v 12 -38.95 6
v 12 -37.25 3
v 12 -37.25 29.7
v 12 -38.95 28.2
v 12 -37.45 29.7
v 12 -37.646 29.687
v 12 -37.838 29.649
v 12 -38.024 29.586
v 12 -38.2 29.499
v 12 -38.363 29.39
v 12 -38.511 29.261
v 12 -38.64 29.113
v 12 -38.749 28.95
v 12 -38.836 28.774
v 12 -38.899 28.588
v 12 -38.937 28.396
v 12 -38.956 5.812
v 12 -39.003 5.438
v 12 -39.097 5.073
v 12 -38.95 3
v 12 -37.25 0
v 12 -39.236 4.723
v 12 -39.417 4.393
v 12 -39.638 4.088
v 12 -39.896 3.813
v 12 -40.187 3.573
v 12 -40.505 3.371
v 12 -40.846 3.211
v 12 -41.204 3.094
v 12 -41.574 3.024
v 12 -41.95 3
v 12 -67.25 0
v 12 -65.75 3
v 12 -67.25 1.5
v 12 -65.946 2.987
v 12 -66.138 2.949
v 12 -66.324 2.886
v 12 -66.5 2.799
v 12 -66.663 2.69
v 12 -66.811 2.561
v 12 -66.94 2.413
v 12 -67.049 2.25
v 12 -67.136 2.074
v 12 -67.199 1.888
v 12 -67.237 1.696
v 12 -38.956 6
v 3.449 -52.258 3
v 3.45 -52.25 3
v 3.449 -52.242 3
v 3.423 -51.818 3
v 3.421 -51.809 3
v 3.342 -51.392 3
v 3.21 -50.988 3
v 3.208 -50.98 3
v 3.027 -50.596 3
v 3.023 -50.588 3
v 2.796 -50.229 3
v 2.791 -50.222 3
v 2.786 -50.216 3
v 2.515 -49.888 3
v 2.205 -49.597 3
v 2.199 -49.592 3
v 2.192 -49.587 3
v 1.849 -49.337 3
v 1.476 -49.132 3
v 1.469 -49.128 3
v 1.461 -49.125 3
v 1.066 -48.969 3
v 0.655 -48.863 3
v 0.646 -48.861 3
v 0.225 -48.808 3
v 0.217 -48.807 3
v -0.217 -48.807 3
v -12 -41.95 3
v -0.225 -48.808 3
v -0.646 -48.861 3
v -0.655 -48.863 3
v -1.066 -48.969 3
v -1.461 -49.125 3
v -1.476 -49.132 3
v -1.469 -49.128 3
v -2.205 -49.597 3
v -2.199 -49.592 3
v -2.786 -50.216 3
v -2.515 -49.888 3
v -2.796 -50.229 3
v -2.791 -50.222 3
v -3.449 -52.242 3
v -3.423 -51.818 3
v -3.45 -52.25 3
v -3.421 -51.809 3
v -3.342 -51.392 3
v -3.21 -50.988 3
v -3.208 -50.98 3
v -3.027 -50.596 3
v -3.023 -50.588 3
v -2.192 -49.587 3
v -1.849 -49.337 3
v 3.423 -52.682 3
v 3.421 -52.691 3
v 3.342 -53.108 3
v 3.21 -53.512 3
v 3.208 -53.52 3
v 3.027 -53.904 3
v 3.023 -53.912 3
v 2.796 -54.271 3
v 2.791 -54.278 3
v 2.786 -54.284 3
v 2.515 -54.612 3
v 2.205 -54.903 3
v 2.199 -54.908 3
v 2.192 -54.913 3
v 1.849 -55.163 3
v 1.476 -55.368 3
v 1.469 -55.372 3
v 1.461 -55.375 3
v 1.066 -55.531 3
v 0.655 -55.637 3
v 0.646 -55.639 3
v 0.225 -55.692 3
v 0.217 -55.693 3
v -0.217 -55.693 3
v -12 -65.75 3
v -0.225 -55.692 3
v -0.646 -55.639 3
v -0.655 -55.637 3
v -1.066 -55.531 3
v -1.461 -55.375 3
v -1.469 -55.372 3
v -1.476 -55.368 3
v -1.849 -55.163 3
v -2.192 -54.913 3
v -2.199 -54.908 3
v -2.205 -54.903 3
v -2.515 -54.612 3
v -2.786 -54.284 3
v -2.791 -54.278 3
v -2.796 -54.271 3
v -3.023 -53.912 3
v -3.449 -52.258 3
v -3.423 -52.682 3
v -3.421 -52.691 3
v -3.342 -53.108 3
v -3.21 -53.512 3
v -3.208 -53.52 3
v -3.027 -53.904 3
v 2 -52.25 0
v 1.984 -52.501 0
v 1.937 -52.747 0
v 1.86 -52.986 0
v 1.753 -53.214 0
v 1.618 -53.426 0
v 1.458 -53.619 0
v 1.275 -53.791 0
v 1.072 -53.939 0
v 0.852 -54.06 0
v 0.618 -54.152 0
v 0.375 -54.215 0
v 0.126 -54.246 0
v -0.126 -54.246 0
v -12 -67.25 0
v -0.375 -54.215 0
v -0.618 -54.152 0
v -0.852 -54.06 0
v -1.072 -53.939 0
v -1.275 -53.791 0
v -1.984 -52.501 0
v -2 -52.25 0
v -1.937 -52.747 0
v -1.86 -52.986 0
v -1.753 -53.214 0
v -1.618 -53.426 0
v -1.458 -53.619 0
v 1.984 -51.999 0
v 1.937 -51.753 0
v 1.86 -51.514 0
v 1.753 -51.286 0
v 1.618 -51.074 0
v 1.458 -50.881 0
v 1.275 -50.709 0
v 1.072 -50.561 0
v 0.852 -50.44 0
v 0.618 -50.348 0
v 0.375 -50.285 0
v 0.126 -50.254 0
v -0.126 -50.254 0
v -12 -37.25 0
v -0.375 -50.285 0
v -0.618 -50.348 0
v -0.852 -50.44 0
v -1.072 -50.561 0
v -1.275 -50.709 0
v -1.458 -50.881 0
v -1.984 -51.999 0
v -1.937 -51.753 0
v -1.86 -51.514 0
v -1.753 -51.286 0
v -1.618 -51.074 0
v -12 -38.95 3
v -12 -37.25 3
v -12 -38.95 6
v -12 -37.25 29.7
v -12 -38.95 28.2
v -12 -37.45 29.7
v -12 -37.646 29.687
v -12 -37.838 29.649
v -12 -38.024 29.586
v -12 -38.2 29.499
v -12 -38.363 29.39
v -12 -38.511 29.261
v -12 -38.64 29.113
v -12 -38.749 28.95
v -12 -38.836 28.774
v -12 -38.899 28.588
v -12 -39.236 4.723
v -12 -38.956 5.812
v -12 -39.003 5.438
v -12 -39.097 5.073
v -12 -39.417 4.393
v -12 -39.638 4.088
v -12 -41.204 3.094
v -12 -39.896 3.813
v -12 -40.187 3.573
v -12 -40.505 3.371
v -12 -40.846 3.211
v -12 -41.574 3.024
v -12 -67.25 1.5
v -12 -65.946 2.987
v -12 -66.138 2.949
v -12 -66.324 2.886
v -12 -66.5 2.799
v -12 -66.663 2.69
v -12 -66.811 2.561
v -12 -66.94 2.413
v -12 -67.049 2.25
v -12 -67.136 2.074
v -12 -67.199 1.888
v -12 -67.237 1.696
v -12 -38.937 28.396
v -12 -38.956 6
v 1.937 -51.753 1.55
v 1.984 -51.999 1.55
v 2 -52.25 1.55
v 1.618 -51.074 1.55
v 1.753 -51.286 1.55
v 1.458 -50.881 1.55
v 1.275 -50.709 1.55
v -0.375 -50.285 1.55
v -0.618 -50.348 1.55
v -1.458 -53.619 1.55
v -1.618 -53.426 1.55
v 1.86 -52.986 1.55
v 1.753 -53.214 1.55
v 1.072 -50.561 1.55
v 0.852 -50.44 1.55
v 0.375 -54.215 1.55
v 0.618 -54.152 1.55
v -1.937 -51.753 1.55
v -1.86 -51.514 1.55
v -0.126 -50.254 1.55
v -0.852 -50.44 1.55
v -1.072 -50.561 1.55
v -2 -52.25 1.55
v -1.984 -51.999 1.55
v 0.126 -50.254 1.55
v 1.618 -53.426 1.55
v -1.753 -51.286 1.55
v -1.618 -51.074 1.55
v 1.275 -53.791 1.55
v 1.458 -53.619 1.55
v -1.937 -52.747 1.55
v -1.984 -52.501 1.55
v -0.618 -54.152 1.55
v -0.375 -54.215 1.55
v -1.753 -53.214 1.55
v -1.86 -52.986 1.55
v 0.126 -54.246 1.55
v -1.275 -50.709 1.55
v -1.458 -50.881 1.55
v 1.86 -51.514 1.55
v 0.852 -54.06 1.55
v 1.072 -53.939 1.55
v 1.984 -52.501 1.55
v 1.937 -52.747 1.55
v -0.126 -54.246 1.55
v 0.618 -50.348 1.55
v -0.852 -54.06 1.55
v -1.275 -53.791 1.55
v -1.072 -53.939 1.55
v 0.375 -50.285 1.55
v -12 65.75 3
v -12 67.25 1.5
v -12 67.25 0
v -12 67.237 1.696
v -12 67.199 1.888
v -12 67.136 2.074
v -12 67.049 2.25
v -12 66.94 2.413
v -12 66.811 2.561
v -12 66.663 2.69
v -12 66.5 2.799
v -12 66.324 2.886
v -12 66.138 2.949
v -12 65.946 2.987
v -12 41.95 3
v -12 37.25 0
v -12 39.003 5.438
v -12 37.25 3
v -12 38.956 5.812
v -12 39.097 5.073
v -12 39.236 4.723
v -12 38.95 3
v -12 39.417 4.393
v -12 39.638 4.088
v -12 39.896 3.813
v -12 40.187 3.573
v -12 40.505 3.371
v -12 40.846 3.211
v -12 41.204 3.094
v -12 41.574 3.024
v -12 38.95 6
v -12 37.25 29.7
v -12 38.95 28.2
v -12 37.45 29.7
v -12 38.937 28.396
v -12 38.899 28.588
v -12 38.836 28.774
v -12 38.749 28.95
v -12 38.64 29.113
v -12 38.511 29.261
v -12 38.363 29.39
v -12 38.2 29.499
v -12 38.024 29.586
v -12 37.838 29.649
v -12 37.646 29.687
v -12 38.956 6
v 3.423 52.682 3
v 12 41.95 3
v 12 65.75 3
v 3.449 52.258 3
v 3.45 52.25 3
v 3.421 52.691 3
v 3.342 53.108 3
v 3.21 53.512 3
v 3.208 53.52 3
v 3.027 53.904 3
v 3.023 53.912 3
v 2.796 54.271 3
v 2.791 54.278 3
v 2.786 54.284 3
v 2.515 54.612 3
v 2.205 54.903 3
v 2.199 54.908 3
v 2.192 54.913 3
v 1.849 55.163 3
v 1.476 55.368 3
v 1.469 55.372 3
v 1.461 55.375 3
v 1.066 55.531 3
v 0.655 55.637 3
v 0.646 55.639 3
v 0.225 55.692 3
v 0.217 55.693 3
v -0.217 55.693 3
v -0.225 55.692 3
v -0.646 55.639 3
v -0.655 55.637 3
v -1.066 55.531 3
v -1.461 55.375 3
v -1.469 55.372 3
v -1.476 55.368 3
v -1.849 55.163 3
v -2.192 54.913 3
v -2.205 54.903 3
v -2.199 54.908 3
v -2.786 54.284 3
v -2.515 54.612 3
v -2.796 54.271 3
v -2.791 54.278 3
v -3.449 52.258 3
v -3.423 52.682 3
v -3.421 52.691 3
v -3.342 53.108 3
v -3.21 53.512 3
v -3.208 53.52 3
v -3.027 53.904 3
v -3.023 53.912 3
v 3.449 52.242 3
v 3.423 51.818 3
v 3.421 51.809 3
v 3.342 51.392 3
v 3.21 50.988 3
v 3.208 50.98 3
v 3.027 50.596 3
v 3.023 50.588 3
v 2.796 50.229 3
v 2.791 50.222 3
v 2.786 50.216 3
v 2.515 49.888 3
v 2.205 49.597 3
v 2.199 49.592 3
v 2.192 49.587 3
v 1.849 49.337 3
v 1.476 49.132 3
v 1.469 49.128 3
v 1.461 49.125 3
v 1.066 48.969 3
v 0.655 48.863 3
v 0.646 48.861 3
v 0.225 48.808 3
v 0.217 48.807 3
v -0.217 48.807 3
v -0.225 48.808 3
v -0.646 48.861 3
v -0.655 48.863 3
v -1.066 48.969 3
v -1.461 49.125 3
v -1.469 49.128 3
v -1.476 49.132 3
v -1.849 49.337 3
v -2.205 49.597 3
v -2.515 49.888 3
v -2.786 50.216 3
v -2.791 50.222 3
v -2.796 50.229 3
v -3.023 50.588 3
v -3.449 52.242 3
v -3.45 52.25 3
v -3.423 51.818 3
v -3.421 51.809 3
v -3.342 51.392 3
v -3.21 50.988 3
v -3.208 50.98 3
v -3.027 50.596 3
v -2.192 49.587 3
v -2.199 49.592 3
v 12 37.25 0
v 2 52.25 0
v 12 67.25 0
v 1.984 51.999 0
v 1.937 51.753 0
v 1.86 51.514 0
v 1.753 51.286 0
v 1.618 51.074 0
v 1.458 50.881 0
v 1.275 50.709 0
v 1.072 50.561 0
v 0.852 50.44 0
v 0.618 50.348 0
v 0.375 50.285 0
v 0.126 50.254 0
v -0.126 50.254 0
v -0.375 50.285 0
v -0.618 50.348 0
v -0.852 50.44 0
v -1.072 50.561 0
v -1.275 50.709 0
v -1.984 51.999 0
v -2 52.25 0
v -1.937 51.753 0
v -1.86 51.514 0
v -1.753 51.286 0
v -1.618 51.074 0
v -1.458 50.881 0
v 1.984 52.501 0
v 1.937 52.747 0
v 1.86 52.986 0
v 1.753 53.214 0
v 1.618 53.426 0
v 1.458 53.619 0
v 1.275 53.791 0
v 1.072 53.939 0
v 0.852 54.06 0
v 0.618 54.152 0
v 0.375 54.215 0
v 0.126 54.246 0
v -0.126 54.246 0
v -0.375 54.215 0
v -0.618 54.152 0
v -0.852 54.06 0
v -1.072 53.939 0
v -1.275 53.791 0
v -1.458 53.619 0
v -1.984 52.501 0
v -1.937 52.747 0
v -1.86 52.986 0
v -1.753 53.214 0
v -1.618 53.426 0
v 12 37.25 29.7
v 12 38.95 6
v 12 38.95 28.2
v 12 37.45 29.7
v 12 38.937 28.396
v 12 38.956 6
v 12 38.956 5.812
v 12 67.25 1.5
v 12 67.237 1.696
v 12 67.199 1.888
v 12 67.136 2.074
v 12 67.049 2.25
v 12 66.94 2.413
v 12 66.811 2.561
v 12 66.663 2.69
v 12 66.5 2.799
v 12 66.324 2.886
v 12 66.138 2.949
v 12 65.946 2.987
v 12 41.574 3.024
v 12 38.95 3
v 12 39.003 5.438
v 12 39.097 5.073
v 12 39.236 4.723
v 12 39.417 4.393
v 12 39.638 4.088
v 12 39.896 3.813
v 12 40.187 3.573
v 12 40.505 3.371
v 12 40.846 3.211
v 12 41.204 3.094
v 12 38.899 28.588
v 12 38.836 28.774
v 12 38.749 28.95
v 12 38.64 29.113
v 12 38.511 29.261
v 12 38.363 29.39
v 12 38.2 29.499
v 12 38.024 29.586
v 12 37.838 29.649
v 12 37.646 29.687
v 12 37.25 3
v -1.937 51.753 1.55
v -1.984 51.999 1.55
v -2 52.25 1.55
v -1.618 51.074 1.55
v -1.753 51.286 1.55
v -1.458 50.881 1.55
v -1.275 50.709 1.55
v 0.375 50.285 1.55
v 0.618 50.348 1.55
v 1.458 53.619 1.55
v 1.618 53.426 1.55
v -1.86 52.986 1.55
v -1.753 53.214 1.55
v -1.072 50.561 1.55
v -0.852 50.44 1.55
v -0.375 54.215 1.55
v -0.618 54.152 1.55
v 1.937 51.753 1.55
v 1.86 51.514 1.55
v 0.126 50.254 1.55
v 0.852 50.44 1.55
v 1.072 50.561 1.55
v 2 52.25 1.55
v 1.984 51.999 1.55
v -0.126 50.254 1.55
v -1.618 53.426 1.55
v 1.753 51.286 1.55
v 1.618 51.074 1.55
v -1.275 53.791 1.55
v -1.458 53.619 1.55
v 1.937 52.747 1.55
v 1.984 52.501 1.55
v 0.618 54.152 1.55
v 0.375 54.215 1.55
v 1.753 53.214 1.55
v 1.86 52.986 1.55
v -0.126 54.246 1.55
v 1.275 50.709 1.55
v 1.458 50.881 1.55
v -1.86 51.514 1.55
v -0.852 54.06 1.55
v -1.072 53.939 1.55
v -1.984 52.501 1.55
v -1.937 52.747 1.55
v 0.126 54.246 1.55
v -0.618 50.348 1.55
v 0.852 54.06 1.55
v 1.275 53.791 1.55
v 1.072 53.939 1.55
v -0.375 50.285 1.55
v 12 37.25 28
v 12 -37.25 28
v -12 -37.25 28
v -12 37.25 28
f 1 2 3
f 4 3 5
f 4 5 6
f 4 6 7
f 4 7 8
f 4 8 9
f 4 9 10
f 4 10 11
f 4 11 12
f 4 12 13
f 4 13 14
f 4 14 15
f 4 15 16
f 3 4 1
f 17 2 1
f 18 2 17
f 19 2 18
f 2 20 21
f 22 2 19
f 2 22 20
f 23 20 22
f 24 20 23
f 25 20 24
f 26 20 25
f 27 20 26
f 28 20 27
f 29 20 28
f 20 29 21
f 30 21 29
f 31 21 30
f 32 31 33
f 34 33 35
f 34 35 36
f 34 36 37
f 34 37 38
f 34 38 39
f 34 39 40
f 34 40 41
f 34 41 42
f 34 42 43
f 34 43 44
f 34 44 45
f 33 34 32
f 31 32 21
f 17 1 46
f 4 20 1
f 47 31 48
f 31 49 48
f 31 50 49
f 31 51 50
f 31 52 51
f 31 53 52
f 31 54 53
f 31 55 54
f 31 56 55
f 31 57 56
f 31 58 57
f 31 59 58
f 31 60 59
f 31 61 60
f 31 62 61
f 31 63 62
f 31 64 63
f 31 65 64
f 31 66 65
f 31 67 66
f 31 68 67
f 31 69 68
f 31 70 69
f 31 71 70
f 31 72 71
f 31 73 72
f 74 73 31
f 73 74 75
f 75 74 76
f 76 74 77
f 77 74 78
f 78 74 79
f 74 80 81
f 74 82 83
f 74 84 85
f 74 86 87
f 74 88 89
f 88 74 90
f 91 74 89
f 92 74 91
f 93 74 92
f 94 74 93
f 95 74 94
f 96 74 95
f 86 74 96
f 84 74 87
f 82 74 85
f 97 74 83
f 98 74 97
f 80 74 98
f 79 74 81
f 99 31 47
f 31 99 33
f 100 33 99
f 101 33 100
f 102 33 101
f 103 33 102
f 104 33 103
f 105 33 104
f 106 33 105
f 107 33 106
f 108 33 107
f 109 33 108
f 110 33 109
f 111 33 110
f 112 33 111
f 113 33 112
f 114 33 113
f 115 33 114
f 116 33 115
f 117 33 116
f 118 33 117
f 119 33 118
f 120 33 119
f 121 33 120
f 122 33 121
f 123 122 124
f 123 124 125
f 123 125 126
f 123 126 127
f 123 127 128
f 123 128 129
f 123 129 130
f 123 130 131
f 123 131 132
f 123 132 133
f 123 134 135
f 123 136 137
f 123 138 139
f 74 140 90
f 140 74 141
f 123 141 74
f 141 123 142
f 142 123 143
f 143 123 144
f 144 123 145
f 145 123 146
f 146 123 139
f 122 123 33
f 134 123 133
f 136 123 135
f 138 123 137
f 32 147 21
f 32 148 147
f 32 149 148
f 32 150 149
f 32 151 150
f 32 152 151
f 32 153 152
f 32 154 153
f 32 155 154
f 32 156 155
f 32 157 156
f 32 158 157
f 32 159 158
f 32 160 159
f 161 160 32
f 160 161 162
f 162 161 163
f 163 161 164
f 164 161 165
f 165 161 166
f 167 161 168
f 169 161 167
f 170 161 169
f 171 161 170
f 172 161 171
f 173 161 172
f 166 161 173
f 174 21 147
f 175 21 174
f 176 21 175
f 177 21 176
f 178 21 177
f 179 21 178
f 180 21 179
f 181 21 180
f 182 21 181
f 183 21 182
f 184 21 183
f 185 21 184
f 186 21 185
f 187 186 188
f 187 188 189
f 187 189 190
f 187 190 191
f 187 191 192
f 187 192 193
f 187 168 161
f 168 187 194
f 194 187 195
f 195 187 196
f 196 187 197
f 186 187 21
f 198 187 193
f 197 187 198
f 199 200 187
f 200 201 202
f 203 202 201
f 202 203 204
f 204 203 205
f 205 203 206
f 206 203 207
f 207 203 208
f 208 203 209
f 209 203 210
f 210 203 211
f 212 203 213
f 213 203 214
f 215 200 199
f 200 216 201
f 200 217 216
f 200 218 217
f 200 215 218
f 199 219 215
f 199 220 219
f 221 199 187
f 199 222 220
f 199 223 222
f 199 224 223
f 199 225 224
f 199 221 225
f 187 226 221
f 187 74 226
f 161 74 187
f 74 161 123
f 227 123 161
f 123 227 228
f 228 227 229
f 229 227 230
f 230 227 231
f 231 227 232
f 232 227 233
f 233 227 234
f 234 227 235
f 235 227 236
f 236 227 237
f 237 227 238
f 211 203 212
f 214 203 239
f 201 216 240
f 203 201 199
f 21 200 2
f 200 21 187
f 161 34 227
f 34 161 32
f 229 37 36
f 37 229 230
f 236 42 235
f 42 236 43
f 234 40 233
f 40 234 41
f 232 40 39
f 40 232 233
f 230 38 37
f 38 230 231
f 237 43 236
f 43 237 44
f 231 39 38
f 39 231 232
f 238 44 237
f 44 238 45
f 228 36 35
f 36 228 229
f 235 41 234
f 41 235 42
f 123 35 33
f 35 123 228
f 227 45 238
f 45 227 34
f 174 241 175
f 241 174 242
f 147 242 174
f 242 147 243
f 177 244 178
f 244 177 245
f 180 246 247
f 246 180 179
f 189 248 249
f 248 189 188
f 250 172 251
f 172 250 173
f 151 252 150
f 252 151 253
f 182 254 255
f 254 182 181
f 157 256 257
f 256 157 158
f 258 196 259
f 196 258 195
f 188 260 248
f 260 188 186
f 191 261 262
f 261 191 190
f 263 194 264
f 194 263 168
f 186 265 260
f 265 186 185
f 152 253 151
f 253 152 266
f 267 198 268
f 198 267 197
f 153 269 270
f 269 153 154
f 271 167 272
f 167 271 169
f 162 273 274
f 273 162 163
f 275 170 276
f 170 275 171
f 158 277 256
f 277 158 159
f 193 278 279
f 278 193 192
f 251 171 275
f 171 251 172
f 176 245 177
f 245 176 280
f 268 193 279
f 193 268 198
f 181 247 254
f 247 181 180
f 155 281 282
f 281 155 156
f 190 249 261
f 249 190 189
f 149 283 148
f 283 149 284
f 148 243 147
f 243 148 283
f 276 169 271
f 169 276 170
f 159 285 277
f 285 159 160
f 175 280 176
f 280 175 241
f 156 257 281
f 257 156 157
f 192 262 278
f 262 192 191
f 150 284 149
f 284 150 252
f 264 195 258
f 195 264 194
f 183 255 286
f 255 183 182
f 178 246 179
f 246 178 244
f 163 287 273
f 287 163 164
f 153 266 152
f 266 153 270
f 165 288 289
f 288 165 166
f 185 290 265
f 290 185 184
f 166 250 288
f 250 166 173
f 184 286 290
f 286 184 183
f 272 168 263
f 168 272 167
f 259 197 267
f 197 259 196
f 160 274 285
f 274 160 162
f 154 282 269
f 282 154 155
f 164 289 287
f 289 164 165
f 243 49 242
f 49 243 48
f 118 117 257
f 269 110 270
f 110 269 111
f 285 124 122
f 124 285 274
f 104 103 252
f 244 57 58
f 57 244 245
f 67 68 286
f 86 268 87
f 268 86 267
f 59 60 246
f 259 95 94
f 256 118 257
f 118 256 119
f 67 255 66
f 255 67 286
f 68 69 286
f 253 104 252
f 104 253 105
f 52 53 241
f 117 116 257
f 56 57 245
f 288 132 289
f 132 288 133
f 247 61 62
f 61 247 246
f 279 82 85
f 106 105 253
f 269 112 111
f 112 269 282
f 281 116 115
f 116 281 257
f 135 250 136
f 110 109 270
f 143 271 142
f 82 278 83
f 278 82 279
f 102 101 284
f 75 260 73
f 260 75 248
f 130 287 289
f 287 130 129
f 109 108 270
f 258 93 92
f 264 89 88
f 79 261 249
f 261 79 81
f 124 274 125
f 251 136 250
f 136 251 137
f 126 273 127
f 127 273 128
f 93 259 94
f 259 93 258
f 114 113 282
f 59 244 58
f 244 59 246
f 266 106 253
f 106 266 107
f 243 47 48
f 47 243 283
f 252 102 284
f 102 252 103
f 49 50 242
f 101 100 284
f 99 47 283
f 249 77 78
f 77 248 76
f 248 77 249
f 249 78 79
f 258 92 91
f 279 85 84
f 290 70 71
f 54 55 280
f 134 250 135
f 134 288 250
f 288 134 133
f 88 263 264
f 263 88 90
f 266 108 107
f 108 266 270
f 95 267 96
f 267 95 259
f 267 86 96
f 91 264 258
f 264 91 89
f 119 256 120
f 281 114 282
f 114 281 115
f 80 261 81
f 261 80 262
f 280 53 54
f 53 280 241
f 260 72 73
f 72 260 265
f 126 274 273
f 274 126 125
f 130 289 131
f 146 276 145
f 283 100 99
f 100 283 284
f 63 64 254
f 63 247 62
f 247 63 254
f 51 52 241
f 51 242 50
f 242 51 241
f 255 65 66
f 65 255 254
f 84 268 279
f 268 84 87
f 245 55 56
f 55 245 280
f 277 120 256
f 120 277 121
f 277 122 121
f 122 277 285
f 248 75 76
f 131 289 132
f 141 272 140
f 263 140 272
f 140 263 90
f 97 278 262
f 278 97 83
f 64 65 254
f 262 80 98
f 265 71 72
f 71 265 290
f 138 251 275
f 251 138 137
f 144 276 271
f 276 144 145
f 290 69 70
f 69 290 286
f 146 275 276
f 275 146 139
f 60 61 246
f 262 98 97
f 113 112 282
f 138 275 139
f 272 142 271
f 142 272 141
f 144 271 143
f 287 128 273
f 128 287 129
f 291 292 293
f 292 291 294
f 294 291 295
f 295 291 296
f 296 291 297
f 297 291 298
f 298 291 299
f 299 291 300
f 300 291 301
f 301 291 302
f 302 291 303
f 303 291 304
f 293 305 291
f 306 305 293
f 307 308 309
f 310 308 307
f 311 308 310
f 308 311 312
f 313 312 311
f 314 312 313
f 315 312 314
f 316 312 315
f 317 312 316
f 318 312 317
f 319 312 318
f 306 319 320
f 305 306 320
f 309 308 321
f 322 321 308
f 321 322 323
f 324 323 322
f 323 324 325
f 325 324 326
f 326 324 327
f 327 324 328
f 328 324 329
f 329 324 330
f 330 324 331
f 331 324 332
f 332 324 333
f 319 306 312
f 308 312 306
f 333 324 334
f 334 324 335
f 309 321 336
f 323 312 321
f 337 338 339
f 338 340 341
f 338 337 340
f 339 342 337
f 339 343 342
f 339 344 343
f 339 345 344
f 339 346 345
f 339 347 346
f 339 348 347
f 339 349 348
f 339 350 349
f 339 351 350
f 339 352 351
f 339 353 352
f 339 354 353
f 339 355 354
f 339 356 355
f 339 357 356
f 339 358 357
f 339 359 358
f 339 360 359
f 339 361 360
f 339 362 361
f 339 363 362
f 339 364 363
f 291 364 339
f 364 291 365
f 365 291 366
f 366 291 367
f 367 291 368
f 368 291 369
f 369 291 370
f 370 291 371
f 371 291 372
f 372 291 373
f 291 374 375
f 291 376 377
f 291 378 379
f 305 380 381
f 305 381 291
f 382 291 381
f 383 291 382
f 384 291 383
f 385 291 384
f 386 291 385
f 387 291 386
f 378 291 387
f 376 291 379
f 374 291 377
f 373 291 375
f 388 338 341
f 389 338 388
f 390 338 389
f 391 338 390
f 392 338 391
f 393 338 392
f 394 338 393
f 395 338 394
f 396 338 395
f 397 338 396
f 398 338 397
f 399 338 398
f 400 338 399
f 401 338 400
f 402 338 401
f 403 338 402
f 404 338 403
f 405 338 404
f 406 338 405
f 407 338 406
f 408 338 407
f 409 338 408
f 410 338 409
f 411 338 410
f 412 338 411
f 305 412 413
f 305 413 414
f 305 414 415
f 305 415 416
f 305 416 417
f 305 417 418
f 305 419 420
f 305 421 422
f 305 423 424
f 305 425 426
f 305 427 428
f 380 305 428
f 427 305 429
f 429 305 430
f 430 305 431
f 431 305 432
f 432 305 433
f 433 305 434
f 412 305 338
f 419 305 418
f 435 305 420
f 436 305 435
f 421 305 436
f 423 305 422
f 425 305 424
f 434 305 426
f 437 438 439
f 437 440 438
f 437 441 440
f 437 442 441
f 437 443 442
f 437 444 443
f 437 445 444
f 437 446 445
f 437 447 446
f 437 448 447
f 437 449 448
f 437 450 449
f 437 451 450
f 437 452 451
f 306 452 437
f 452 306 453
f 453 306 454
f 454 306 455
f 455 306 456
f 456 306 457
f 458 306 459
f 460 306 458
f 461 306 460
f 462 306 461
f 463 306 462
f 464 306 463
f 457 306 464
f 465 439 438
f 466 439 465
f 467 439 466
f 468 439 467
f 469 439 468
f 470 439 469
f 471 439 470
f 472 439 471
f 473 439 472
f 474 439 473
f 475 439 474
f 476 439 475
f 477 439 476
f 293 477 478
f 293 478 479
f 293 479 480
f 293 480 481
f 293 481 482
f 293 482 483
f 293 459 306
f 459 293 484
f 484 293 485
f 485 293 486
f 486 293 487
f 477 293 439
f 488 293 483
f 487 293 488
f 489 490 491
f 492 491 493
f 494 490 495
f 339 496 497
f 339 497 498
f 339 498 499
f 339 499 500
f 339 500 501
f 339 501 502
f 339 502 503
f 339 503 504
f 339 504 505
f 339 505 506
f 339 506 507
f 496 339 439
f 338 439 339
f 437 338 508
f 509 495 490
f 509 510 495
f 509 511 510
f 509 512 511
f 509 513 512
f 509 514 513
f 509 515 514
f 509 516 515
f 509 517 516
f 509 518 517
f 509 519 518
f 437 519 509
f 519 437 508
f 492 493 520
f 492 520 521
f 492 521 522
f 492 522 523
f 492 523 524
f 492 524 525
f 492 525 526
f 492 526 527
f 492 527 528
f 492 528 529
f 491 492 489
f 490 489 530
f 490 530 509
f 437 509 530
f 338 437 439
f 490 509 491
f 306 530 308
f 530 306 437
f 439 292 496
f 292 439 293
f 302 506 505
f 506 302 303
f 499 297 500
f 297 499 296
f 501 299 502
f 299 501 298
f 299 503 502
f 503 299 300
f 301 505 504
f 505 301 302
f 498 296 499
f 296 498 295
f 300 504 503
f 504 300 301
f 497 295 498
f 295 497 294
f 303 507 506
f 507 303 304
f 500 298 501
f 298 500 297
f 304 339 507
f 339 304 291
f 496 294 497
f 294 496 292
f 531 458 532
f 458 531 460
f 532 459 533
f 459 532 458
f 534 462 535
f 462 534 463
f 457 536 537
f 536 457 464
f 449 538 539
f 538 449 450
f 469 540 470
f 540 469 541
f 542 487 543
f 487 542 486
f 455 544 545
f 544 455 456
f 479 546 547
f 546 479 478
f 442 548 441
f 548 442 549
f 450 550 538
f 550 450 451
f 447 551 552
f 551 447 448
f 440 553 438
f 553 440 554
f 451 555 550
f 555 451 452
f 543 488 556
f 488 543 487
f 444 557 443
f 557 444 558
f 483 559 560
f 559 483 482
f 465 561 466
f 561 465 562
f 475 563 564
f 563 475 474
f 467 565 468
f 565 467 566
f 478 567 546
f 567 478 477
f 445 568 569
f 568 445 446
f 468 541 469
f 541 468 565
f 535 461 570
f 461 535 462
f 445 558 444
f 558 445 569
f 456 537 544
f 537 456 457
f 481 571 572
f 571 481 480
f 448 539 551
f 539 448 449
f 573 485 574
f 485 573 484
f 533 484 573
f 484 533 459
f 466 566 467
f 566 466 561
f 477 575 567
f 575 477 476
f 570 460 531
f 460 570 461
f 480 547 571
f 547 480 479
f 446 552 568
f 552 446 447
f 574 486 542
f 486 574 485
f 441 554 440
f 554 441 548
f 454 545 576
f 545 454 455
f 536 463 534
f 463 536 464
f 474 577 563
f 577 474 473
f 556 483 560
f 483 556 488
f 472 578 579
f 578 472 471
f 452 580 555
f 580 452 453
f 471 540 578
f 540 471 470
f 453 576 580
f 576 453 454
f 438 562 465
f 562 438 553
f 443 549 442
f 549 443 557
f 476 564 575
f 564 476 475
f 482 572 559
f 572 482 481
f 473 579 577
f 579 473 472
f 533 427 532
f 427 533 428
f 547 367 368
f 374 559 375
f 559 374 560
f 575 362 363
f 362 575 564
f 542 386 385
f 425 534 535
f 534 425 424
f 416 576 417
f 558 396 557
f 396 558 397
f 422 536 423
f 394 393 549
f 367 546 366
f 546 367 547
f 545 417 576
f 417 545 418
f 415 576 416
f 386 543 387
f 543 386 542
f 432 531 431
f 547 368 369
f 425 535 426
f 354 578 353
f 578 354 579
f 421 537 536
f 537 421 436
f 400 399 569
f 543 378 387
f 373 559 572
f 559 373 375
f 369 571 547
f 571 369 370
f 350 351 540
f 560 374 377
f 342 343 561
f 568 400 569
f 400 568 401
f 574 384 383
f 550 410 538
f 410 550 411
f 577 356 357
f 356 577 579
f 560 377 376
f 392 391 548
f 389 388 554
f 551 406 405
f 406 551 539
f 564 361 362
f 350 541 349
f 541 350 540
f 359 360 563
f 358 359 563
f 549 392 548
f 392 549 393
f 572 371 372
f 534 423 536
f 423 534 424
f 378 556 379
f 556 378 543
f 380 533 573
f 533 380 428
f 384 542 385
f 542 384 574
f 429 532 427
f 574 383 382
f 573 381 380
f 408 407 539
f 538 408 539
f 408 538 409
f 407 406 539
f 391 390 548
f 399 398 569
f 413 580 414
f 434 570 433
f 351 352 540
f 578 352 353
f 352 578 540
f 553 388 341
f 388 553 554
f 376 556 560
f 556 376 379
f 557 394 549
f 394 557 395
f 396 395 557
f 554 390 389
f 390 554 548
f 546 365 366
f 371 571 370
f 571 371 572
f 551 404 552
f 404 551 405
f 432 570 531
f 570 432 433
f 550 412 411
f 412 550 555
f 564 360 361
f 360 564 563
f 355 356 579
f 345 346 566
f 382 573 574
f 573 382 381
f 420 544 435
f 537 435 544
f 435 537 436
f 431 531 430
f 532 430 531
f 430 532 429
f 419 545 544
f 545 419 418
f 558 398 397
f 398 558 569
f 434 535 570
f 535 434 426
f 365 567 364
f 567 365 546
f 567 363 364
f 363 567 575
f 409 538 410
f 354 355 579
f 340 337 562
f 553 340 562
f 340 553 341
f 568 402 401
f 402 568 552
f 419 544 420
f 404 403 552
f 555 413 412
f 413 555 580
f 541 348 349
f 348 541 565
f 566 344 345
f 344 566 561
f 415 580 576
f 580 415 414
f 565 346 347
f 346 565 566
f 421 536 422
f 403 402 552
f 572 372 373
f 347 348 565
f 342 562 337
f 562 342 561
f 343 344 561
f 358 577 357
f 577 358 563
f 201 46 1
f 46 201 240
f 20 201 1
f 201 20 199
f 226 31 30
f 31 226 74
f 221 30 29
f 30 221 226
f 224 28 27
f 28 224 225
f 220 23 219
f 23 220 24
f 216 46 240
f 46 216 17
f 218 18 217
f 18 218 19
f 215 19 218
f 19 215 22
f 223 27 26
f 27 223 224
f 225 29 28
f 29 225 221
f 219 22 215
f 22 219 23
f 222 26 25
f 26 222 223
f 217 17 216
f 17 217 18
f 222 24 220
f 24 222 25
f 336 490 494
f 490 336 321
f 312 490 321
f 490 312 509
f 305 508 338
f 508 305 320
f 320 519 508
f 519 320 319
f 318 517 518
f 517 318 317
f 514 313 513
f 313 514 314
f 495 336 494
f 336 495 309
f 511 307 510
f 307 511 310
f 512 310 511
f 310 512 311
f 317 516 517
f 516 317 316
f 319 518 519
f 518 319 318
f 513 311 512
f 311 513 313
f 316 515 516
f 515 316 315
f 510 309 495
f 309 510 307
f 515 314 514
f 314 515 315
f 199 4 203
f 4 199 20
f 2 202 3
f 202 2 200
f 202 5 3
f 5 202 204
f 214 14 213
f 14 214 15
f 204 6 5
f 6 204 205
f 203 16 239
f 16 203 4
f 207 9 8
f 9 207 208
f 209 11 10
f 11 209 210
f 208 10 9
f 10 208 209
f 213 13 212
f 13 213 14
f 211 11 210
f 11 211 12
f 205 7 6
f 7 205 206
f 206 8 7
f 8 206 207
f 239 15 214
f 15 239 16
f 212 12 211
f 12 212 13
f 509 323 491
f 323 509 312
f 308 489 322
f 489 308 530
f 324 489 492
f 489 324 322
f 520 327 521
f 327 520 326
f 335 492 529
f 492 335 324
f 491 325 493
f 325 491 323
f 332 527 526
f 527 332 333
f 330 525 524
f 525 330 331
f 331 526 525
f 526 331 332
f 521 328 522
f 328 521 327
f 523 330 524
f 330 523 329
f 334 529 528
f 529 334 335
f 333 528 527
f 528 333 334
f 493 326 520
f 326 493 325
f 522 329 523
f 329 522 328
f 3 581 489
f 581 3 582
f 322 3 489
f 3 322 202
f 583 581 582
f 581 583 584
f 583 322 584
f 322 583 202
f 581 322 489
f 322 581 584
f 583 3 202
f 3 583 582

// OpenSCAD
// file: rounded.scad
$fn=50;

module rounded_rectangle(width, height, radius) {
    minkowski() {
        square([width - radius*2, height - radius*2], center=true);
        circle(radius);
    }
}

module rounded_rectangle_border(width, height, radius, wall_width) {
    difference() {
      rounded_rectangle(width, height, radius);
      rounded_rectangle(width - wall_width*2, height - wall_width*2, radius);       
    }
}

module rounded_cube(width, depth, height, radius) {
    minkowski() {
        cube([width - radius*2, depth - radius*2, height - radius*2], center=true);
        sphere(radius);
    }
}

module half_rounded_cube(width, depth, height, radius) {
    intersection() {
        rounded_cube(width, depth, height*2, radius);
        
        translate([-width/2, -depth/2, 0])
        cube([width, depth, height]);
    }
}

module quarter_rounded_cube(width, depth, height, radius) {
    intersection() {
        rounded_cube(width, depth*2, height*2, radius);
        
        translate([-width/2, 0, 0])
        cube([width, depth, height]);
    }
}

module negative_edge(width, radius) {
    difference() {
        cube([width, radius, radius], center = true);

        translate([0, radius/2, radius/2])
        rotate([0,90,0])
        cylinder(h = width + 0.1, r = radius, center = true);
    }
}


module rounded_edge(width, depth, height, radius) {
    assert(radius <= height, "Radius must be less or equal to the height");
    union() {
        translate([0, radius, 0])
        cube([width, depth - radius, height]);

        cube([width, radius, height - radius]);
       
        translate([0, radius, (height - radius)])
        quarter_cylinder(height = width, radius = radius);
    }    
}

module centered_rounded_edge(width, depth, height, radius) {
    translate([-width/2, -depth/2, -height/2])
    rounded_edge(width, depth, height, radius);
}

module quarter_cylinder(height, radius) {   
    rotate([90, -90, 90])
    rotate_extrude(angle = 90)
    square([radius, height]);
}

//cube([10,20,30]);
//rounded_cube(30, 50, 12, 5);
//half_rounded_cube(30, 50, 6, 5);
//quarter_rounded_cube(30, 25, 6, 5);
//centered_rounded_edge(100, 30, 12, 11);
//half_cylinder(30, 5);
//negative_edge(40, 5);
// main file
$fn=50;

use <rounded.scad>

module grip(grip_depth, object_width, object_height, thingy_depth = 30, bottom_wall_width = 3, wall_width = 1.7) {
    $large_fillet_radius = 3;
    
    union() {
        // Horizontal Left
        translate([0, -thingy_depth/2 - object_width/2, bottom_wall_width/2])
        grip_thingy(width = grip_depth, depth = thingy_depth, height = bottom_wall_width);
      
        // Horizontal Right
        translate([0, thingy_depth/2 + object_width/2, bottom_wall_width/2])
        rotate([0,0,180])
        grip_thingy(width = grip_depth, depth = thingy_depth, height = bottom_wall_width);
        
        // Fillet Left
        translate([0, - $large_fillet_radius/2 - wall_width - object_width/2, $large_fillet_radius/2 + bottom_wall_width])
        rotate([0, 0, 180])
        negative_edge(width = grip_depth, radius = $large_fillet_radius);
        
        // Fillet Right
        translate([0, + $large_fillet_radius/2 + wall_width + object_width/2, $large_fillet_radius/2 + bottom_wall_width])
        negative_edge(width = grip_depth, radius = $large_fillet_radius);
        
        // Vertical Left
        translate([0, -wall_width/2 - object_width/2, object_height/2 + wall_width/2])
        rotate([90, 180, 0])
        centered_rounded_edge(width = grip_depth, depth = object_height + wall_width, height = wall_width, radius = 1.5);
        
        // Vertical right
        translate([0, wall_width/2 + object_width/2, object_height/2 + wall_width/2])
        rotate([-90, 0, 0])
        centered_rounded_edge(width = grip_depth, depth = object_height + wall_width, height = wall_width, radius = 1.5);
        
        // Bar
        translate([0, 0, wall_width/2 + object_height])
        cube([grip_depth, object_width, wall_width], center=true);
    }
}

// The part that touches the table (where the screw goes)
module grip_thingy(width, depth, height, screw_hole_diameter = 4, radius = 1.5) {
    $cone_height = 2;
    difference() {
      centered_rounded_edge(width, depth, height, radius);
      chamfered_hole(height + 0.1, screw_hole_diameter, screw_hole_diameter + 3);
    }
}

module chamfered_hole(height, hole_diameter, chamfer_diameter) {
    $chamfer_height = (chamfer_diameter - hole_diameter) / 2;
    $cylinder_height = height - $chamfer_height;
    
    translate([0, 0, -height/2])
    union() {
      // Add 0.1 to make sure the union with the chamfer is perfect
      cylinder(h = $cylinder_height + 0.1, d = hole_diameter);
    
      translate([0, 0, $cylinder_height])
      cylinder(h = $chamfer_height, d1 = hole_diameter, d2 = chamfer_diameter);
    }  
}

//grip_thingy(width = 15, depth = 30, height = 3);
//grip(grip_depth = 15, object_width = 100, object_height = 30);

// 4-port USB Charger
//grip(grip_depth = 34, object_width = 59, object_height = 28);

// Type-C Charger
grip(grip_depth = 24, object_width = 74.5, object_height = 28);
